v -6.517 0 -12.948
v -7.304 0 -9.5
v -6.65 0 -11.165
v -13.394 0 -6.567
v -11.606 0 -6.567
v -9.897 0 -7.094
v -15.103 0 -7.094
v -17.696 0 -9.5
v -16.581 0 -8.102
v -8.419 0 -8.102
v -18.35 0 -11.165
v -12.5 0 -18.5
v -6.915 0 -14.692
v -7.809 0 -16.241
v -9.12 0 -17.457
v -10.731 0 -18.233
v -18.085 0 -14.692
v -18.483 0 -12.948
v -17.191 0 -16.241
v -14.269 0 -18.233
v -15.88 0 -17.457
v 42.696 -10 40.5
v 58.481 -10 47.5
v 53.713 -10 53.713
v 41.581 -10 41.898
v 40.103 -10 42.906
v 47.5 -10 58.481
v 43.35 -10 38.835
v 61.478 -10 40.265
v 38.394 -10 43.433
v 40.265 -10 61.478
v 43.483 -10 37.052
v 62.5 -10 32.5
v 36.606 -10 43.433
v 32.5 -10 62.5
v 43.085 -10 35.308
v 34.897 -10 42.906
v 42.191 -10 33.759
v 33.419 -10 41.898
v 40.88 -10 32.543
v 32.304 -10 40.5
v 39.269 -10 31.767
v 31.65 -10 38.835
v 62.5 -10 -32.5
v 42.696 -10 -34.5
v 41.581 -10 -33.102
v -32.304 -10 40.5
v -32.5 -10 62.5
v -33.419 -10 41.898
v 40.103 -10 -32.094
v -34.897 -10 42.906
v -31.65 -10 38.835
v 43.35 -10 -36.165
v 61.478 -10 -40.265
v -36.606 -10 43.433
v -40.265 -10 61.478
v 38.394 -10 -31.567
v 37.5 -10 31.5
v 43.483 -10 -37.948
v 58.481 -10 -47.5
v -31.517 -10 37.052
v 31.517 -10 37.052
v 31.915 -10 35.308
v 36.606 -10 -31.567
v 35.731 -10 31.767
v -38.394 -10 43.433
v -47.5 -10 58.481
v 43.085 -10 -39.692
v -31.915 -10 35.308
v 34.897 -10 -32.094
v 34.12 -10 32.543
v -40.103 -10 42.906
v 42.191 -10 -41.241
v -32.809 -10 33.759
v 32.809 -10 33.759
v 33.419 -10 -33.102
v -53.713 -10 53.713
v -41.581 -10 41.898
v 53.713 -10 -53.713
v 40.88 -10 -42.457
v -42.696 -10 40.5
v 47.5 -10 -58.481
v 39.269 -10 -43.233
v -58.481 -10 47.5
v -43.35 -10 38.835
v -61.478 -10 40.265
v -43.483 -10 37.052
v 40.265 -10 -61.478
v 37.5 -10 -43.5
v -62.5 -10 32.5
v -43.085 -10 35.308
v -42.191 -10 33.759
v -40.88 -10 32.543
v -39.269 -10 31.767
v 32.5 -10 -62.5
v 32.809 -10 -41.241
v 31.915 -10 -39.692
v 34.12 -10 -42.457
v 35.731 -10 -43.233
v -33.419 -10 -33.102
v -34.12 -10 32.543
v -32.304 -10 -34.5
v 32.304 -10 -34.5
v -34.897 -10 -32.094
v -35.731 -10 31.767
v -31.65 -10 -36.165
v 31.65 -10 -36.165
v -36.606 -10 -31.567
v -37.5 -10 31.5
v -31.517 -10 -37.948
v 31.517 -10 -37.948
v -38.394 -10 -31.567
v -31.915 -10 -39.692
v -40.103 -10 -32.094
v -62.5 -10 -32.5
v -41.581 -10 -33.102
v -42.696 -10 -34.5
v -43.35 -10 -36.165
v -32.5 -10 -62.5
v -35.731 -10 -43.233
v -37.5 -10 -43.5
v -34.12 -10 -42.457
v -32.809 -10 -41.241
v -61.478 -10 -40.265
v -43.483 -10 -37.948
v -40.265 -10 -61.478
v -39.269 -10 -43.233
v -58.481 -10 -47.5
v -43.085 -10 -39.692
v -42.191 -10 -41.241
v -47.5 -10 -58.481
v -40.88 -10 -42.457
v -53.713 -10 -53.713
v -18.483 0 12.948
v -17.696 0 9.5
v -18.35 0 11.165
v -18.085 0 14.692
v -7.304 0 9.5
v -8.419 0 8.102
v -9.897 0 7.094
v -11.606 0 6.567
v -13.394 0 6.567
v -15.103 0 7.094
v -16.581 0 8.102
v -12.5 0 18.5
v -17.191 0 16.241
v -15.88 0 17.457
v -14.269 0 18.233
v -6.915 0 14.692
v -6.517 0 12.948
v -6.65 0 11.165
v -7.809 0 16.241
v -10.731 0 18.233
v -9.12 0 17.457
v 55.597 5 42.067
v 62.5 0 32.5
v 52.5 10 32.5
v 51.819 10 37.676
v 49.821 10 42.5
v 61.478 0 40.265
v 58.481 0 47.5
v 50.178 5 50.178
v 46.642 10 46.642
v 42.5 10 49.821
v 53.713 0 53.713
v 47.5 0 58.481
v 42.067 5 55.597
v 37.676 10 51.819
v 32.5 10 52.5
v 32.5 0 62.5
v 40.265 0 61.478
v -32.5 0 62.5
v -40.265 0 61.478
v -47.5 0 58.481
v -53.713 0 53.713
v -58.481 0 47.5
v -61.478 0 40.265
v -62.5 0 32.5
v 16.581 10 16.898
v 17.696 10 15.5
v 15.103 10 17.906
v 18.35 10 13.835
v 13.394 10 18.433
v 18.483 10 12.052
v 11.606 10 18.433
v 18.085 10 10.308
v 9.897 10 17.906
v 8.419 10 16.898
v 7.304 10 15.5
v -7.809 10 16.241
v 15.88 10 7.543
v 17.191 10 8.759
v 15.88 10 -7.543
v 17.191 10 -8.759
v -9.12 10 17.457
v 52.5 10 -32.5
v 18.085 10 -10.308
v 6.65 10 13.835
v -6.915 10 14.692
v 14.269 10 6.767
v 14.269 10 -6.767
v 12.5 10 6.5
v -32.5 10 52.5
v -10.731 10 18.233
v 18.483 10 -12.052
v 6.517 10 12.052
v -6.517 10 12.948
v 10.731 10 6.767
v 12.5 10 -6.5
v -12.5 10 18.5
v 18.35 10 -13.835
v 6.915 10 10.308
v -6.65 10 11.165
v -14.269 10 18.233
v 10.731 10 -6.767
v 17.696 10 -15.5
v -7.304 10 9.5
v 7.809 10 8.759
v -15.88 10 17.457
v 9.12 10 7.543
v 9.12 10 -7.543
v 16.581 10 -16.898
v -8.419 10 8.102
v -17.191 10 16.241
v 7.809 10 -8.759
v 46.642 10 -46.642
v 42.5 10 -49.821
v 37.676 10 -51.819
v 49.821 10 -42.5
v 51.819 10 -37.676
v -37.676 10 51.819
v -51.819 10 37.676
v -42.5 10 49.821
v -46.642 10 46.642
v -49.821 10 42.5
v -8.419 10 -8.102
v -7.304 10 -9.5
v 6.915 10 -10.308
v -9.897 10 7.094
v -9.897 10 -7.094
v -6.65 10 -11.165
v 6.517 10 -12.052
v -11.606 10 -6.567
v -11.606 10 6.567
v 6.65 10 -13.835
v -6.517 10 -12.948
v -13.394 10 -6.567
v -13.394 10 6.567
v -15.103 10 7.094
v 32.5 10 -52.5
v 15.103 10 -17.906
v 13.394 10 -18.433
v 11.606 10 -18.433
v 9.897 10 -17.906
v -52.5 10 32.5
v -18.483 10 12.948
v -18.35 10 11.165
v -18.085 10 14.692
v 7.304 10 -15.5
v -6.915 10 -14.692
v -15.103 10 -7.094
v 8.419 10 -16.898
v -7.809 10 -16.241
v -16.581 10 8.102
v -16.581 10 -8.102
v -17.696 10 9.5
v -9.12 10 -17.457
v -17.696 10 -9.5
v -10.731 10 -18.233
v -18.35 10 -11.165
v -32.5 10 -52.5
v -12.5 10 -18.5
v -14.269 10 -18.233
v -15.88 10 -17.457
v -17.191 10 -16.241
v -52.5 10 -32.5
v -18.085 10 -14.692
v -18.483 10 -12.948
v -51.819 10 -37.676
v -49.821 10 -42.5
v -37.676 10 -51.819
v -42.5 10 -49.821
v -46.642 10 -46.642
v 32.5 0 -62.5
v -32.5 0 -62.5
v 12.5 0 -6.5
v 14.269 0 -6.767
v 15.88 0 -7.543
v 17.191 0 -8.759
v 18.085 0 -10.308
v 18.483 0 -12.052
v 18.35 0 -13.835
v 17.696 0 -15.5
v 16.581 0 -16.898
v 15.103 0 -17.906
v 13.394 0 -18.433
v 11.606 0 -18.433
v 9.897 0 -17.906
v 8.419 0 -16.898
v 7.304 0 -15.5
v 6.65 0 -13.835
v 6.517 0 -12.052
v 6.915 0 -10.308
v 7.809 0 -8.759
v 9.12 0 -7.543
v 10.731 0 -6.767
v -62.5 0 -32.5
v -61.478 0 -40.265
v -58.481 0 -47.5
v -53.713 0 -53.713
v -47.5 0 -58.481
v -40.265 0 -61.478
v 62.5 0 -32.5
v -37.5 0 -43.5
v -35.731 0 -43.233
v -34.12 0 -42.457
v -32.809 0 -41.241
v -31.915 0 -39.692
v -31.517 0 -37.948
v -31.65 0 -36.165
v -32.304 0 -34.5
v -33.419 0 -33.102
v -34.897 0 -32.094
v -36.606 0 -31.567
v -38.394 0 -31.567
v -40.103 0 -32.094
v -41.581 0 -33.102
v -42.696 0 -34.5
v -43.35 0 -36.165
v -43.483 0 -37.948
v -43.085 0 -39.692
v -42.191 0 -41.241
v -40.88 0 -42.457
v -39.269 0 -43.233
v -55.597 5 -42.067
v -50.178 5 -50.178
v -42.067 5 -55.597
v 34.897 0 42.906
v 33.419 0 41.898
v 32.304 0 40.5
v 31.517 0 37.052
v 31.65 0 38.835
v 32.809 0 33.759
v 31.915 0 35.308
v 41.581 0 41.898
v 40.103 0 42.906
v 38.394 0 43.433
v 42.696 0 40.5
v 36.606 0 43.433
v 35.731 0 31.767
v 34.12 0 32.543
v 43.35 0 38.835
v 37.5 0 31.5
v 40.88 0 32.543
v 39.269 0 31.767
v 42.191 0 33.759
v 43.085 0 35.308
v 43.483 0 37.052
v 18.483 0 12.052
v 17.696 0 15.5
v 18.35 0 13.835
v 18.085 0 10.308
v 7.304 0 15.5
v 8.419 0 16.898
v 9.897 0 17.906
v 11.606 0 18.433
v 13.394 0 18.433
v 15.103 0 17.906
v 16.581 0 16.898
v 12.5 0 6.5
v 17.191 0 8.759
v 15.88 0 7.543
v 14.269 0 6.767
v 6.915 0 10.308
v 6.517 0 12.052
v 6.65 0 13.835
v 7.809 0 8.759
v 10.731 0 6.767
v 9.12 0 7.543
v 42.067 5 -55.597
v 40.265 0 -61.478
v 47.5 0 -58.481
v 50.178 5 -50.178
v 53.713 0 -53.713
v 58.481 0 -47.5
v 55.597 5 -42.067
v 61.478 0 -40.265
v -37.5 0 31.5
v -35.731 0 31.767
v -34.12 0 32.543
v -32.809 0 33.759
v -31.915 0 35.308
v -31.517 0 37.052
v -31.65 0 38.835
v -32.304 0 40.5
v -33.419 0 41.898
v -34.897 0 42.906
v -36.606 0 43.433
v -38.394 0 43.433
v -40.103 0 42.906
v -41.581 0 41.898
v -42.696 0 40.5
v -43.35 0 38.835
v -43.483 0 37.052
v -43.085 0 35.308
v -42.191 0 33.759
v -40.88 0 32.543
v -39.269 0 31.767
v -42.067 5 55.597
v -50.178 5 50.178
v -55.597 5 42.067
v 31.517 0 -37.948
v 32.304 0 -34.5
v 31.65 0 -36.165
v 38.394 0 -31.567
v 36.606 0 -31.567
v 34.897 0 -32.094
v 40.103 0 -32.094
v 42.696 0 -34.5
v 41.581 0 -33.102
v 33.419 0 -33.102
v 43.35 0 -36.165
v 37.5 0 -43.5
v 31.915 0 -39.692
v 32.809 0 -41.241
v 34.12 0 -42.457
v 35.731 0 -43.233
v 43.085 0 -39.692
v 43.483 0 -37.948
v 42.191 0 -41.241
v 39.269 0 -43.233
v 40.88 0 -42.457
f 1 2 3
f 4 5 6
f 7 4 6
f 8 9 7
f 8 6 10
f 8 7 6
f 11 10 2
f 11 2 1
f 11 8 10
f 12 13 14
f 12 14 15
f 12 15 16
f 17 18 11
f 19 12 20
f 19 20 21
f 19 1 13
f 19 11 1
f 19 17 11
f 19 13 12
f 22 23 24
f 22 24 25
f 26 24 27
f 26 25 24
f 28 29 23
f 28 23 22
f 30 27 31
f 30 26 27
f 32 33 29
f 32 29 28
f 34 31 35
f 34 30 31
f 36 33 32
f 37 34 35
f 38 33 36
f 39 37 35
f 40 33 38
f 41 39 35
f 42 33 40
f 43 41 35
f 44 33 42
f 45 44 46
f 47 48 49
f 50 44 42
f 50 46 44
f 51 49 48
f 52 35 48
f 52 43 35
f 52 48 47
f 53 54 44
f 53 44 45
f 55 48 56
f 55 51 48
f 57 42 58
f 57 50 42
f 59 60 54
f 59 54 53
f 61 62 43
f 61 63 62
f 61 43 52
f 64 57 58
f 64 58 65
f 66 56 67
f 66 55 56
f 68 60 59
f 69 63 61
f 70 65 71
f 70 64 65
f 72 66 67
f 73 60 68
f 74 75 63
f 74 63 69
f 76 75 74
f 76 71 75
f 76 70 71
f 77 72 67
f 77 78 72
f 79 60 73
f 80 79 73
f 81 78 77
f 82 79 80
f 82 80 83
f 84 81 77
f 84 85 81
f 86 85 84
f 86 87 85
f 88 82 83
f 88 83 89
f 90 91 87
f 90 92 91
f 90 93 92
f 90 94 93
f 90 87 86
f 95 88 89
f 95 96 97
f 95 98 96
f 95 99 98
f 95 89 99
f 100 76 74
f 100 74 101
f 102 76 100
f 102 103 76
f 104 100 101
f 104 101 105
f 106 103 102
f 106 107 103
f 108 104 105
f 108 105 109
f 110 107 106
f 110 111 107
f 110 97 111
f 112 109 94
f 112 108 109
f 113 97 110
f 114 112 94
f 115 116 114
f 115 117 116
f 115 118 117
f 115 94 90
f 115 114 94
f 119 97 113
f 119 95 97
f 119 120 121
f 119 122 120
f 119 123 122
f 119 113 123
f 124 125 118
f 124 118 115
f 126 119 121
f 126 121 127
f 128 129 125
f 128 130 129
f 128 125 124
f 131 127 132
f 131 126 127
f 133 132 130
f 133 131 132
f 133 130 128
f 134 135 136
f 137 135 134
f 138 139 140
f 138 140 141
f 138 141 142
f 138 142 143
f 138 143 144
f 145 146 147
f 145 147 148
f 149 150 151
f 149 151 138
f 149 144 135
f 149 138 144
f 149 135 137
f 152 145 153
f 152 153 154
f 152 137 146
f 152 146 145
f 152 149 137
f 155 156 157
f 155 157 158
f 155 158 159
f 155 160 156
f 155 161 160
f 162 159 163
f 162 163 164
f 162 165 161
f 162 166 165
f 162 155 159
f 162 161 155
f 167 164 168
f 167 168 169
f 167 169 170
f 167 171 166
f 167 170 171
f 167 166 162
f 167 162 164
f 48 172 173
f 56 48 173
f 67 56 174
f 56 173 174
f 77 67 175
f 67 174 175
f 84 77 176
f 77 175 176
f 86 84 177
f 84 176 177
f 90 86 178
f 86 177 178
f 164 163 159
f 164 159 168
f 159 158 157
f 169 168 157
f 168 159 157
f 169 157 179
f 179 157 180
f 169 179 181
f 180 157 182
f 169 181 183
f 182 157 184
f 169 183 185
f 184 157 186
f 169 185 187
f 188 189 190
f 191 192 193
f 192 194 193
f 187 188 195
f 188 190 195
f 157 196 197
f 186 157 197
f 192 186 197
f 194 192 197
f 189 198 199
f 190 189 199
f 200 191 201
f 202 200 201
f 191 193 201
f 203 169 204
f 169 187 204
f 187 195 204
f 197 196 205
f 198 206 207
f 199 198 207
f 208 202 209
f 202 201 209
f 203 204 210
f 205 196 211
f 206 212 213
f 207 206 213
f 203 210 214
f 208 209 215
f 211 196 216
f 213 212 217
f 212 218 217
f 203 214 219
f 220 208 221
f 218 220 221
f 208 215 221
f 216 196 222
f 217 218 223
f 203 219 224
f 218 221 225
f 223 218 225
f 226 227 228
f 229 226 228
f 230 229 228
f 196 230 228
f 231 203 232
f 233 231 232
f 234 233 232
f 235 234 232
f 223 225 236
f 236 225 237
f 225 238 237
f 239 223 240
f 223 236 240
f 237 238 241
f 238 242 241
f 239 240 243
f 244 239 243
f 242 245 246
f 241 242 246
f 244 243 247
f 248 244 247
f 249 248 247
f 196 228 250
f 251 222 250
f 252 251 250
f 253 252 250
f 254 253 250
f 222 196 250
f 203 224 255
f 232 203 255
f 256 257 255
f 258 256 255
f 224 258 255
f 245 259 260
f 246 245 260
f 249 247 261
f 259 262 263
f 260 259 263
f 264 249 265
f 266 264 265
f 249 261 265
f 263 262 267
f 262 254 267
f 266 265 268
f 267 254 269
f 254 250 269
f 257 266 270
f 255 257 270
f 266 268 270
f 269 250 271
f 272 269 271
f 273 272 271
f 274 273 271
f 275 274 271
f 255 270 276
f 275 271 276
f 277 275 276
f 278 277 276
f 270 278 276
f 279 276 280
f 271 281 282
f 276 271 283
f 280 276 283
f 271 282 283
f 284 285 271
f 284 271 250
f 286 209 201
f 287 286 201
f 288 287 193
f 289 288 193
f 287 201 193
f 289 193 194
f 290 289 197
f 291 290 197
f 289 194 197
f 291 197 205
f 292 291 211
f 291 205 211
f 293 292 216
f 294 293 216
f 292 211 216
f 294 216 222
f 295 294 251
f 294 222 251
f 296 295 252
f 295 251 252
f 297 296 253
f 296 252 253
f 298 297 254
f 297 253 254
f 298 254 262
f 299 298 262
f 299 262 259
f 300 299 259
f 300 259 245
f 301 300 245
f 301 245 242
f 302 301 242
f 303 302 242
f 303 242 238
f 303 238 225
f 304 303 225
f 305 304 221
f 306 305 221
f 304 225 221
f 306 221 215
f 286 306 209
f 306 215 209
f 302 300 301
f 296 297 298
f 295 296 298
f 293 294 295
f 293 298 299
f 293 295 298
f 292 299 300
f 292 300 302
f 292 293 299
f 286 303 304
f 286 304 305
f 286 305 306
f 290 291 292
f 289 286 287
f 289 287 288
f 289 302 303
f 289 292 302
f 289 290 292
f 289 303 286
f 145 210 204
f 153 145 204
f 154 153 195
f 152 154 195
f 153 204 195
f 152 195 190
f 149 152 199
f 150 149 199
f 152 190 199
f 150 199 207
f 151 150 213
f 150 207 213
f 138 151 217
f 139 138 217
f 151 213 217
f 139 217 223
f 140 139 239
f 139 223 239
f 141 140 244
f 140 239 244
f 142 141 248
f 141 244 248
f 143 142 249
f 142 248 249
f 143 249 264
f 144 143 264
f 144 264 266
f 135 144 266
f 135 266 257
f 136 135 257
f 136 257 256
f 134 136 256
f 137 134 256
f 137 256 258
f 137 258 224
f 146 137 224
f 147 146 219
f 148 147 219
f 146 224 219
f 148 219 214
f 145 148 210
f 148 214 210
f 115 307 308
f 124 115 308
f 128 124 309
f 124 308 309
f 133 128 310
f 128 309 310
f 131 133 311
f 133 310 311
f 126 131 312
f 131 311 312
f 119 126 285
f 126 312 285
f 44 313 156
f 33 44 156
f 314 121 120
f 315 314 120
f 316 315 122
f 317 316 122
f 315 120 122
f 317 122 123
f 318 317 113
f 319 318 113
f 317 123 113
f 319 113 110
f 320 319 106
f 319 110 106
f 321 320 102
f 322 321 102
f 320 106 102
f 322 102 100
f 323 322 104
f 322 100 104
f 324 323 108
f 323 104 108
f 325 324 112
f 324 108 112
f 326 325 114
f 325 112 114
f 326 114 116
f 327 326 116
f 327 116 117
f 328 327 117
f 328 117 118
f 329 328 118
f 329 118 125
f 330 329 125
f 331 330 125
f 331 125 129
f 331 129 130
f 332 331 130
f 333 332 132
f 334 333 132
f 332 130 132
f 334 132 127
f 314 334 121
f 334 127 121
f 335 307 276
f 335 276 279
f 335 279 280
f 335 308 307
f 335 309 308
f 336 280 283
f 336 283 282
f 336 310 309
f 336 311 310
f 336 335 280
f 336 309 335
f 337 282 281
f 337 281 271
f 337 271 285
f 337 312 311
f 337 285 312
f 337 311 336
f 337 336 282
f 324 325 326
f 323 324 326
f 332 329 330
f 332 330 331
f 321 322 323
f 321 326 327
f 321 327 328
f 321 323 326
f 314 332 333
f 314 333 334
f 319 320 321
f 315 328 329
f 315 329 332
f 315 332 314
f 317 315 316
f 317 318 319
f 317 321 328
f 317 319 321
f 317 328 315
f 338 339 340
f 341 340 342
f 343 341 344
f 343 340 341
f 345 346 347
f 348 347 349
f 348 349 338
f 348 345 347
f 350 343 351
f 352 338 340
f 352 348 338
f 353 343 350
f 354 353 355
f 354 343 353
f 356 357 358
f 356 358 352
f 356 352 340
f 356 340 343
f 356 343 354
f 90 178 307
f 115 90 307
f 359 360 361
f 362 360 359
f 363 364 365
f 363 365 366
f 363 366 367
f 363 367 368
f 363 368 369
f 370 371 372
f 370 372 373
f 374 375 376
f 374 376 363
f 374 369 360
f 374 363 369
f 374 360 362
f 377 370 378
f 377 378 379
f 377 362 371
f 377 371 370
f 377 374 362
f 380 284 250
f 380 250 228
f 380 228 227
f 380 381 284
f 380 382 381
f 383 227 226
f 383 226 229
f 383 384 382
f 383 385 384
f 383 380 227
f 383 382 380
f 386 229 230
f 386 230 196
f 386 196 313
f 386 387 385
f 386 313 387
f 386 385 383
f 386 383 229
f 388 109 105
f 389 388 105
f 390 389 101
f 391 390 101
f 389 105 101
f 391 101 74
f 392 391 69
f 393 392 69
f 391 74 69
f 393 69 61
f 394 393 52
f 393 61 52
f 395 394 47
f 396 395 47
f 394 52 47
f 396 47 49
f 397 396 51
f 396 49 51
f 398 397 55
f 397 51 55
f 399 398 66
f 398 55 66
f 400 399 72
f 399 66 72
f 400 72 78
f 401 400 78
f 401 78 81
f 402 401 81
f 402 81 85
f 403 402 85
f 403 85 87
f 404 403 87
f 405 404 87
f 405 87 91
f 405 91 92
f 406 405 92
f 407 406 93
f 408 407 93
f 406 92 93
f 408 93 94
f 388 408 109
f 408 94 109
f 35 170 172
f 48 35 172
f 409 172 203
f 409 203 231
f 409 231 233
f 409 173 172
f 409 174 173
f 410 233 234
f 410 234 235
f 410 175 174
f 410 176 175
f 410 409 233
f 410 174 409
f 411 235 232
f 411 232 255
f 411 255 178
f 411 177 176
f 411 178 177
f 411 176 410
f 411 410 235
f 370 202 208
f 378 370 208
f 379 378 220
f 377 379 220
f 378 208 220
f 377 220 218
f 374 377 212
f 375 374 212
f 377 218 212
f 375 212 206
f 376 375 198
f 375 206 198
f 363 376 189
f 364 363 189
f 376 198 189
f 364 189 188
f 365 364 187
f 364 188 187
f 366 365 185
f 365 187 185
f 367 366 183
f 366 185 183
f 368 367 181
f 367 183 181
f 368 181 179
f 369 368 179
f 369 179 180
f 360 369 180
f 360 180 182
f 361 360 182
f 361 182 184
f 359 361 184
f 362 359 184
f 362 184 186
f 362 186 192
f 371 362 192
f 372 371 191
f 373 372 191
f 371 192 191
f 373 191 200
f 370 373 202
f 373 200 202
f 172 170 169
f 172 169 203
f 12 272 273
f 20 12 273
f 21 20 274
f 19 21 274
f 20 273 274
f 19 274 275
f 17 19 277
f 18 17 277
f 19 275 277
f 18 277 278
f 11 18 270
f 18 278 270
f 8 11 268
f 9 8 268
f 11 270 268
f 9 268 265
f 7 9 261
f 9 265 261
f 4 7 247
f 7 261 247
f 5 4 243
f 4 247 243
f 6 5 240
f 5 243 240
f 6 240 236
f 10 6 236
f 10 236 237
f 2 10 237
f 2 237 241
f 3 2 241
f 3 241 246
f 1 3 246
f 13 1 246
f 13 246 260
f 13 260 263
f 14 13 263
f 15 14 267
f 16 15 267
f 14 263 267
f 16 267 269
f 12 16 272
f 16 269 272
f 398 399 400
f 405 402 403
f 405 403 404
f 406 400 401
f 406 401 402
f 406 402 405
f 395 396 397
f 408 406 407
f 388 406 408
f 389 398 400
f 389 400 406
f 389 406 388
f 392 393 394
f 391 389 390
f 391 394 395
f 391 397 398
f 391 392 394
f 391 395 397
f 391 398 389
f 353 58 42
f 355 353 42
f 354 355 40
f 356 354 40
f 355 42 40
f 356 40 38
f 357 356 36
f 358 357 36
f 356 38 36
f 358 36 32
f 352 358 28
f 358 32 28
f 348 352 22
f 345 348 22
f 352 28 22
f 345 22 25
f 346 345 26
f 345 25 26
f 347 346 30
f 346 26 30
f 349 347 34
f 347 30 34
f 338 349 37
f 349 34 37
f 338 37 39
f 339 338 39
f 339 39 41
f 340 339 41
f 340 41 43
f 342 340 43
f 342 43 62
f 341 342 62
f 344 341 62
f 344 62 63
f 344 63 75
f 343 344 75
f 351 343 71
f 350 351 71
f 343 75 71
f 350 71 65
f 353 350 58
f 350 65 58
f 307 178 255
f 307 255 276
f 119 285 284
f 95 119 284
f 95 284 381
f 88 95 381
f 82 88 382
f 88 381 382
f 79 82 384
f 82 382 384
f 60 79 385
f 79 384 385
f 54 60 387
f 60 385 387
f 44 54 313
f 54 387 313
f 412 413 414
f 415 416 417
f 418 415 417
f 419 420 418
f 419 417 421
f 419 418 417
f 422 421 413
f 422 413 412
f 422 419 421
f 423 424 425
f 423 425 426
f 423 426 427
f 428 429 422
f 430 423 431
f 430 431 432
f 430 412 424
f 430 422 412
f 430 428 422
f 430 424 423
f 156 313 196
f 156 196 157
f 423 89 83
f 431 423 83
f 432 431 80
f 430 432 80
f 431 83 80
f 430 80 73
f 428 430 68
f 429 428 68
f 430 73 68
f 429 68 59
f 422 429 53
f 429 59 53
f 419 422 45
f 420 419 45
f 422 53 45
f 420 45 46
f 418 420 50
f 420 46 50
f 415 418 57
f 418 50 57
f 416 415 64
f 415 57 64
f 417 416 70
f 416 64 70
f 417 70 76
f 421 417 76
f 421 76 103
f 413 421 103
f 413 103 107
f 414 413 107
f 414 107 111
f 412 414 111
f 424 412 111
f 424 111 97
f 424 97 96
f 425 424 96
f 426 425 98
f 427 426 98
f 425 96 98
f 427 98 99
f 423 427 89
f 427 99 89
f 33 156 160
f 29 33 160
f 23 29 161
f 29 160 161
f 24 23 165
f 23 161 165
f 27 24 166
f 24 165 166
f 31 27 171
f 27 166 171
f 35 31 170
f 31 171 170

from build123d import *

# Parameters (mm, degrees)
BOSS_EXTRUDE1_DEPTH = 10
CHAMFER1_SIZE       = 10
SKETCH2_R           = 6
CUT_EXTRUDE1_DEPTH  = 10
SKETCH3_R           = 6
CUT_EXTRUDE2_DEPTH  = 10


with BuildPart() as part:
    # Sketch1 → Boss-Extrude1 (new, symmetric)
    with BuildSketch(Plane(origin=(0, 0, 0), x_dir=(1, 0, 0), z_dir=(0, 1, 0))):
        with BuildLine():
            Line((-32.5, 62.5), (32.5, 62.5))
            ThreePointArc((32.5, 62.5), (53.713203436, 53.713203436), (62.5, 32.5))
            Line((62.5, 32.5), (62.5, -32.5))
            ThreePointArc((62.5, -32.5), (53.713203436, -53.713203436), (32.5, -62.5))
            Line((32.5, -62.5), (-32.5, -62.5))
            ThreePointArc((-32.5, -62.5), (-53.713203436, -53.713203436), (-62.5, -32.5))
            Line((-62.5, -32.5), (-62.5, 32.5))
            ThreePointArc((-62.5, 32.5), (-53.713203436, 53.713203436), (-32.5, 62.5))
        make_face()
    extrude(amount=BOSS_EXTRUDE1_DEPTH, both=True)

    # Chamfer1
    chamfer1_edges = [part.edges().sort_by_distance(p)[0] for p in [
        (53.713203436, 10, 53.713203436),
        (62.5, 10, 0),
        (53.713203436, 10, -53.713203436),
        (0, 10, -62.5),
        (-53.713203436, 10, -53.713203436),
        (-62.5, 10, 0),
        (-53.713203436, 10, 53.713203436),
        (0, 10, 62.5),
    ]]
    chamfer(chamfer1_edges, length=CHAMFER1_SIZE)

    # Sketch2 → Cut-Extrude1 (cut)
    with BuildSketch(Plane(origin=(0, 10, 0), x_dir=(1, 0, 0), z_dir=(0, 1, 0))):
        with Locations(Location((12.5, 12.5, 0), (0, 0, 270))):
            Circle(SKETCH2_R)
        with Locations(Location((-12.5, 12.5, 0), (0, 0, 90))):
            Circle(SKETCH2_R)
        with Locations(Location((12.5, -12.5, 0), (0, 0, 90))):
            Circle(SKETCH2_R)
        with Locations(Location((-12.5, -12.5, 0), (0, 0, 270))):
            Circle(SKETCH2_R)
    extrude(amount=-CUT_EXTRUDE1_DEPTH, mode=Mode.SUBTRACT)

    # Sketch3 → Cut-Extrude2 (cut)
    with BuildSketch(Plane.XZ.offset(10)):
        with Locations(Location((37.5, 37.5, 0), (0, 0, 270))):
            Circle(SKETCH3_R)
        with Locations(Location((-37.5, 37.5, 0), (0, 0, 270))):
            Circle(SKETCH3_R)
        with Locations(Location((37.5, -37.5, 0), (0, 0, 270))):
            Circle(SKETCH3_R)
        with Locations(Location((-37.5, -37.5, 0), (0, 0, 270))):
            Circle(SKETCH3_R)
    extrude(amount=-CUT_EXTRUDE2_DEPTH, mode=Mode.SUBTRACT)


solid = part.part
